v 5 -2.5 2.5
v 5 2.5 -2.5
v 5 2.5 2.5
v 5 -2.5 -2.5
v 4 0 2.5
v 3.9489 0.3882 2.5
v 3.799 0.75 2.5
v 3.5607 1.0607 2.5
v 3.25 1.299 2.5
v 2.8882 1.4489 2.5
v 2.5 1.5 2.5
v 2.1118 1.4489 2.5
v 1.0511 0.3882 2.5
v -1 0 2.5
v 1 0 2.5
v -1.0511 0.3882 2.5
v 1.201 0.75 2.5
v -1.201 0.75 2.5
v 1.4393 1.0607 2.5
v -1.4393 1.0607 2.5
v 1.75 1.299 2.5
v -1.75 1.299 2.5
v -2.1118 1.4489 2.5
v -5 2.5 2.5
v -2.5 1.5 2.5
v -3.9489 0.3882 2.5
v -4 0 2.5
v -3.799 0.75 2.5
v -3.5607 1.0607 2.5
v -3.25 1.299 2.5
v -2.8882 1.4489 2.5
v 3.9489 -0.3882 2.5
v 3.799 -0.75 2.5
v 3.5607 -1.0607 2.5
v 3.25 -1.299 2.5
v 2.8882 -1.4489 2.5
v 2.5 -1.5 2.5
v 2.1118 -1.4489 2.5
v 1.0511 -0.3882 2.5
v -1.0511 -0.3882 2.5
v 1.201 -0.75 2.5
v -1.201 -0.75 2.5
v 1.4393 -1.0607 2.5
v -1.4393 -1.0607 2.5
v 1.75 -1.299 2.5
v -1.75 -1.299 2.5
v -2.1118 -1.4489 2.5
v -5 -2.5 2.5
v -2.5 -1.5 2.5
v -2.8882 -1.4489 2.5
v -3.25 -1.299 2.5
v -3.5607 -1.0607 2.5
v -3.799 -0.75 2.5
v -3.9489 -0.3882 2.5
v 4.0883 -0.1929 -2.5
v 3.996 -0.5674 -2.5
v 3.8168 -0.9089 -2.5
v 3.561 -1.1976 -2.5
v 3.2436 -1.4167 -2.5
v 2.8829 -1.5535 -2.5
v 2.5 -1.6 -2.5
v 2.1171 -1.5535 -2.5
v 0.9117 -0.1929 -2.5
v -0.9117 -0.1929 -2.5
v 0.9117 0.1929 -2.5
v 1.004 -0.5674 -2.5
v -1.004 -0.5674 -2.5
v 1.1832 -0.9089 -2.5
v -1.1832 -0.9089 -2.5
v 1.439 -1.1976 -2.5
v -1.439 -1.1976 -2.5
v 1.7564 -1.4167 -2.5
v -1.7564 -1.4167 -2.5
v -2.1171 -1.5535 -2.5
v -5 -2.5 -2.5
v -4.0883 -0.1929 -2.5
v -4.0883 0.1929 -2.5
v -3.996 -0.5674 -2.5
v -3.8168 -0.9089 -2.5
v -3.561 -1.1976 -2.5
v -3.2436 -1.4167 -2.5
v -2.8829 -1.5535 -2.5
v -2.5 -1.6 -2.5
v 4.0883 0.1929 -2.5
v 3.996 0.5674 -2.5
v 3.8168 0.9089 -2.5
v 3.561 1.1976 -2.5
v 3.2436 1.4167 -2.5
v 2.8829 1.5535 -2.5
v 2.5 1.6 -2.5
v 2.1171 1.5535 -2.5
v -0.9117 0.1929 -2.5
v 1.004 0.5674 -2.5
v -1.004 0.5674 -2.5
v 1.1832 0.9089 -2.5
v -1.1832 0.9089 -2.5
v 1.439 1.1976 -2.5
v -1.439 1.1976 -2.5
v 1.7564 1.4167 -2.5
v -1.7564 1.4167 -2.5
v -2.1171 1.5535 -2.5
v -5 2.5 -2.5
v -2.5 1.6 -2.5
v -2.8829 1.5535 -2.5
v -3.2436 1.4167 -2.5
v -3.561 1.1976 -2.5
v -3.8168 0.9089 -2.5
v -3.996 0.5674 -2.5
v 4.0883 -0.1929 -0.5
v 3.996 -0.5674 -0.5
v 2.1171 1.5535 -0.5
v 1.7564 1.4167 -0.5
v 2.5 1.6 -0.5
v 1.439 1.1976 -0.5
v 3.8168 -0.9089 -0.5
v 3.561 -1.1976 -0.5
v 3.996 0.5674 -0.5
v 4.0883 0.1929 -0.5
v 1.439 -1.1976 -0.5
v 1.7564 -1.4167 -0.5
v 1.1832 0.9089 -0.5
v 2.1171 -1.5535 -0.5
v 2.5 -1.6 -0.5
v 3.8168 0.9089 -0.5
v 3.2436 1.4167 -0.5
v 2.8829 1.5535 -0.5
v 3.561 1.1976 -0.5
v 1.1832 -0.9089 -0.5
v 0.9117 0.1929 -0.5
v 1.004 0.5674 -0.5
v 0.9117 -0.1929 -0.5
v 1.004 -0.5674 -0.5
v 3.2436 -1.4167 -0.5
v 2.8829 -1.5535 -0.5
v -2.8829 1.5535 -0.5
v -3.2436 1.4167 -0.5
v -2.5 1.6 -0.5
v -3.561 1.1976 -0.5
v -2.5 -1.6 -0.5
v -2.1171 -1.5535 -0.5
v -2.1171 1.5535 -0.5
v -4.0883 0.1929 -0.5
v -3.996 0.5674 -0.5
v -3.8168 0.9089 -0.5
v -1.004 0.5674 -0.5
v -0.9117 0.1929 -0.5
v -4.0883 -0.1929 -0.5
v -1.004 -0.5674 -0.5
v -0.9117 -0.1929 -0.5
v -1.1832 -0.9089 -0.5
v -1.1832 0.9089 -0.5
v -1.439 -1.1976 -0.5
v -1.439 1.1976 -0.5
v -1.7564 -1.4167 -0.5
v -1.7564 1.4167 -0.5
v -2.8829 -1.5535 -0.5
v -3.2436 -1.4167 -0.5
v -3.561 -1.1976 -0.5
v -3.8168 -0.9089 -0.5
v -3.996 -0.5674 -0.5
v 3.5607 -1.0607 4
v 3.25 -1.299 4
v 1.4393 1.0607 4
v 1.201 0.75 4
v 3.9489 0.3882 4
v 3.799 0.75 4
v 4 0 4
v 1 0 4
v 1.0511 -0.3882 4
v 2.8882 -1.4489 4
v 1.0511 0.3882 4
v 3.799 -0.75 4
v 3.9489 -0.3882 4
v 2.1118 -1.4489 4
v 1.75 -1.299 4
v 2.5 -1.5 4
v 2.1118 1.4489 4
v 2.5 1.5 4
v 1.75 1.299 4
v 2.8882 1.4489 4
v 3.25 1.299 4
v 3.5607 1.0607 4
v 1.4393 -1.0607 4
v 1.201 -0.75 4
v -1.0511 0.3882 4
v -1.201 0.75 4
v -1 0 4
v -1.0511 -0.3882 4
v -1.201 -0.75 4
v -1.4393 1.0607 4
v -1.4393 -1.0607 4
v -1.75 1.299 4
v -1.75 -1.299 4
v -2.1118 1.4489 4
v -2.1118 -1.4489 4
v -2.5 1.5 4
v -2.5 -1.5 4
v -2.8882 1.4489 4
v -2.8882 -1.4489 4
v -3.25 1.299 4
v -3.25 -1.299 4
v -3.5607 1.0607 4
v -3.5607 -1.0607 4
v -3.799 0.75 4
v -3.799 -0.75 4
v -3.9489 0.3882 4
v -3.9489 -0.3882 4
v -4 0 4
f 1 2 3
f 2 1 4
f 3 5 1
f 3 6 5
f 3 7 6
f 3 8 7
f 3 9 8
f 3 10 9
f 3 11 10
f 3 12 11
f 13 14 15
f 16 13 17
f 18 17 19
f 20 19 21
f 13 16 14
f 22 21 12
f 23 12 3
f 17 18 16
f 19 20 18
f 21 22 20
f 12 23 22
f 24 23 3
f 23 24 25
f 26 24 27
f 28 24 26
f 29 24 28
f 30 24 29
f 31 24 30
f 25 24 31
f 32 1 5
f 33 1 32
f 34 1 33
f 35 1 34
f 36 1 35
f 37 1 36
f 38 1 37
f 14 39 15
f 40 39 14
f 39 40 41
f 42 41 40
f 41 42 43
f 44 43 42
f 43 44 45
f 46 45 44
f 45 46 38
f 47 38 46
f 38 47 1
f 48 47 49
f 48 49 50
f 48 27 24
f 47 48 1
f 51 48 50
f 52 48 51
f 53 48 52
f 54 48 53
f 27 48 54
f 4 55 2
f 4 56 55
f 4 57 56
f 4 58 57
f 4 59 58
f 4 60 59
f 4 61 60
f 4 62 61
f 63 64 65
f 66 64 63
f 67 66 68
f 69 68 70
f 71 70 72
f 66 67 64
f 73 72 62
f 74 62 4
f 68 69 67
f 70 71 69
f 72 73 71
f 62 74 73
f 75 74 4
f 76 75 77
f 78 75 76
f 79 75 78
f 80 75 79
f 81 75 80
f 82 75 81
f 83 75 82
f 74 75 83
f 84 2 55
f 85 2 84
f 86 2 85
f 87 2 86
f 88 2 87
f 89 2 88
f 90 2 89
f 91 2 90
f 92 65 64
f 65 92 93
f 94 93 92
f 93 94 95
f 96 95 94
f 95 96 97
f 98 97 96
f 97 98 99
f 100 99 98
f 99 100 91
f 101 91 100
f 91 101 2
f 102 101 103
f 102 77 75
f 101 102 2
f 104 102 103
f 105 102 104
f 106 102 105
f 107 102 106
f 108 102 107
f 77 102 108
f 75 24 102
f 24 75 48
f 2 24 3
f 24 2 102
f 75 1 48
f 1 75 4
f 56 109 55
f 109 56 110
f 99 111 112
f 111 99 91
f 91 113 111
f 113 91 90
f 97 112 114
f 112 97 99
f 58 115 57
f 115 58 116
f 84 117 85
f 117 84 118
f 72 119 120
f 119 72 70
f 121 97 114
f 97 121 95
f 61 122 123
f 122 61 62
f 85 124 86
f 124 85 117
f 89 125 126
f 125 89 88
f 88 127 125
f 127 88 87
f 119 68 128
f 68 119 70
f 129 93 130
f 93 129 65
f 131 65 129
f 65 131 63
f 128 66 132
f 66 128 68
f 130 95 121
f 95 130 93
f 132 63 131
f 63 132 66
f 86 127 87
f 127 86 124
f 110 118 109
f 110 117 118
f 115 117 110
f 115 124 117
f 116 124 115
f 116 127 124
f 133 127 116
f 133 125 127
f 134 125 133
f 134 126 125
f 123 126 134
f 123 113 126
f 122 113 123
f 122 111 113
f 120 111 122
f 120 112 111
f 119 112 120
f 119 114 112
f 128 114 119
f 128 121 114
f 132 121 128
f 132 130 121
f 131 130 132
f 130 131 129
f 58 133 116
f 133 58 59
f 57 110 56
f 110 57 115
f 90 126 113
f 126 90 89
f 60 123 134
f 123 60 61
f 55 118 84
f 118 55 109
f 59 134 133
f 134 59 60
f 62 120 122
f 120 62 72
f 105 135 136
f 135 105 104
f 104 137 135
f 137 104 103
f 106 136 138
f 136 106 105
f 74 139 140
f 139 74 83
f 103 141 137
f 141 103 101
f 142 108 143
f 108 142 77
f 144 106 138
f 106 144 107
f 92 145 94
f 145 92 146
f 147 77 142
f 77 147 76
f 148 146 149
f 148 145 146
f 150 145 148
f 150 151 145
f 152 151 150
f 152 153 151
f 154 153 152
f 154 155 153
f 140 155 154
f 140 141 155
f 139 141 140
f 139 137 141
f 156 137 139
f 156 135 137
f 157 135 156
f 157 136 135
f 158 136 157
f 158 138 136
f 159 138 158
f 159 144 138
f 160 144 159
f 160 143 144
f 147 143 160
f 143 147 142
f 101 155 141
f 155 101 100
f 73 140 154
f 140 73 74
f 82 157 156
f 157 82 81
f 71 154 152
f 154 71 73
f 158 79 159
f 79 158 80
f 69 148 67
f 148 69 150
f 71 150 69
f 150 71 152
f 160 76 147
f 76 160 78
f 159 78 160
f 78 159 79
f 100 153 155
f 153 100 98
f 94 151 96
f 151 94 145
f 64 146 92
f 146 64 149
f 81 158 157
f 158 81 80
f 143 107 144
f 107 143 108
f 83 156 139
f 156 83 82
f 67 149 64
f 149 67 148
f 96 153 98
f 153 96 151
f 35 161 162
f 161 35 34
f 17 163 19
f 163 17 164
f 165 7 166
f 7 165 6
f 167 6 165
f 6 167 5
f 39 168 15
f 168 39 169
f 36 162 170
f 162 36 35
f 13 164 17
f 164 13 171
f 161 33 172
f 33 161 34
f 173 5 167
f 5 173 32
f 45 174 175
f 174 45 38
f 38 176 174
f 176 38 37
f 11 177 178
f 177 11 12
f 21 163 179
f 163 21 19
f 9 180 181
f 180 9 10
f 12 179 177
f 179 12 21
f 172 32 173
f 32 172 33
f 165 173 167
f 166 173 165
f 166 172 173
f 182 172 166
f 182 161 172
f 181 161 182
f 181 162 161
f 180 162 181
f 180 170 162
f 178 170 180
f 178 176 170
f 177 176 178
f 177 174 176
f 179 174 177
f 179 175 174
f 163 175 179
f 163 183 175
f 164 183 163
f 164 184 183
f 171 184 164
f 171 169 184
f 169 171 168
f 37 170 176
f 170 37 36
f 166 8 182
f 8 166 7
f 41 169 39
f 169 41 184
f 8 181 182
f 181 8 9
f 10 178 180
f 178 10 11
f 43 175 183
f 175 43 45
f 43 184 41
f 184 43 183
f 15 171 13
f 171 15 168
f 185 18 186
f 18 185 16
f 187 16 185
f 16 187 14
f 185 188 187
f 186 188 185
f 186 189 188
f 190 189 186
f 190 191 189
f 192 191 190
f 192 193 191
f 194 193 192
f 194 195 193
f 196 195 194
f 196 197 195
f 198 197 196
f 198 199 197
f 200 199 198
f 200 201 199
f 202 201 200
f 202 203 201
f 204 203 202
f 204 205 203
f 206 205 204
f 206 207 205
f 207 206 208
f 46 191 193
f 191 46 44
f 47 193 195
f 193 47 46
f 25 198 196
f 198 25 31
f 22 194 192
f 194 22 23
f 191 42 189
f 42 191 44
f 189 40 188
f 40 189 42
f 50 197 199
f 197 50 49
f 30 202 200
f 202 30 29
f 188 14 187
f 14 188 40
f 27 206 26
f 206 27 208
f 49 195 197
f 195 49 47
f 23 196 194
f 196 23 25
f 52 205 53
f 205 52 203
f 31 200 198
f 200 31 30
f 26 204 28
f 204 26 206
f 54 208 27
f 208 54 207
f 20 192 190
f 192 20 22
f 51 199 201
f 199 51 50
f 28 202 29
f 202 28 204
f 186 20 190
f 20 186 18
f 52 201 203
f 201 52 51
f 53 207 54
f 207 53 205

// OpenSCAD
$fa = 1;
$fs = 0.4;
difference() {
    cube([10,5,5],center=true);
    translate([2.5,0,-3])
        rotate([0,0,90])
            cylinder(2.5,1.6,1.6);
    translate([-2.5,0,-3])
        rotate([0,0,90])
            cylinder(2.5,1.6,1.6);
    };
translate([2.5,0,1.5])
    cylinder(2.5,1.5,1.5);
translate([-2.5,0,1.5])
    cylinder(2.5,1.5,1.5);
